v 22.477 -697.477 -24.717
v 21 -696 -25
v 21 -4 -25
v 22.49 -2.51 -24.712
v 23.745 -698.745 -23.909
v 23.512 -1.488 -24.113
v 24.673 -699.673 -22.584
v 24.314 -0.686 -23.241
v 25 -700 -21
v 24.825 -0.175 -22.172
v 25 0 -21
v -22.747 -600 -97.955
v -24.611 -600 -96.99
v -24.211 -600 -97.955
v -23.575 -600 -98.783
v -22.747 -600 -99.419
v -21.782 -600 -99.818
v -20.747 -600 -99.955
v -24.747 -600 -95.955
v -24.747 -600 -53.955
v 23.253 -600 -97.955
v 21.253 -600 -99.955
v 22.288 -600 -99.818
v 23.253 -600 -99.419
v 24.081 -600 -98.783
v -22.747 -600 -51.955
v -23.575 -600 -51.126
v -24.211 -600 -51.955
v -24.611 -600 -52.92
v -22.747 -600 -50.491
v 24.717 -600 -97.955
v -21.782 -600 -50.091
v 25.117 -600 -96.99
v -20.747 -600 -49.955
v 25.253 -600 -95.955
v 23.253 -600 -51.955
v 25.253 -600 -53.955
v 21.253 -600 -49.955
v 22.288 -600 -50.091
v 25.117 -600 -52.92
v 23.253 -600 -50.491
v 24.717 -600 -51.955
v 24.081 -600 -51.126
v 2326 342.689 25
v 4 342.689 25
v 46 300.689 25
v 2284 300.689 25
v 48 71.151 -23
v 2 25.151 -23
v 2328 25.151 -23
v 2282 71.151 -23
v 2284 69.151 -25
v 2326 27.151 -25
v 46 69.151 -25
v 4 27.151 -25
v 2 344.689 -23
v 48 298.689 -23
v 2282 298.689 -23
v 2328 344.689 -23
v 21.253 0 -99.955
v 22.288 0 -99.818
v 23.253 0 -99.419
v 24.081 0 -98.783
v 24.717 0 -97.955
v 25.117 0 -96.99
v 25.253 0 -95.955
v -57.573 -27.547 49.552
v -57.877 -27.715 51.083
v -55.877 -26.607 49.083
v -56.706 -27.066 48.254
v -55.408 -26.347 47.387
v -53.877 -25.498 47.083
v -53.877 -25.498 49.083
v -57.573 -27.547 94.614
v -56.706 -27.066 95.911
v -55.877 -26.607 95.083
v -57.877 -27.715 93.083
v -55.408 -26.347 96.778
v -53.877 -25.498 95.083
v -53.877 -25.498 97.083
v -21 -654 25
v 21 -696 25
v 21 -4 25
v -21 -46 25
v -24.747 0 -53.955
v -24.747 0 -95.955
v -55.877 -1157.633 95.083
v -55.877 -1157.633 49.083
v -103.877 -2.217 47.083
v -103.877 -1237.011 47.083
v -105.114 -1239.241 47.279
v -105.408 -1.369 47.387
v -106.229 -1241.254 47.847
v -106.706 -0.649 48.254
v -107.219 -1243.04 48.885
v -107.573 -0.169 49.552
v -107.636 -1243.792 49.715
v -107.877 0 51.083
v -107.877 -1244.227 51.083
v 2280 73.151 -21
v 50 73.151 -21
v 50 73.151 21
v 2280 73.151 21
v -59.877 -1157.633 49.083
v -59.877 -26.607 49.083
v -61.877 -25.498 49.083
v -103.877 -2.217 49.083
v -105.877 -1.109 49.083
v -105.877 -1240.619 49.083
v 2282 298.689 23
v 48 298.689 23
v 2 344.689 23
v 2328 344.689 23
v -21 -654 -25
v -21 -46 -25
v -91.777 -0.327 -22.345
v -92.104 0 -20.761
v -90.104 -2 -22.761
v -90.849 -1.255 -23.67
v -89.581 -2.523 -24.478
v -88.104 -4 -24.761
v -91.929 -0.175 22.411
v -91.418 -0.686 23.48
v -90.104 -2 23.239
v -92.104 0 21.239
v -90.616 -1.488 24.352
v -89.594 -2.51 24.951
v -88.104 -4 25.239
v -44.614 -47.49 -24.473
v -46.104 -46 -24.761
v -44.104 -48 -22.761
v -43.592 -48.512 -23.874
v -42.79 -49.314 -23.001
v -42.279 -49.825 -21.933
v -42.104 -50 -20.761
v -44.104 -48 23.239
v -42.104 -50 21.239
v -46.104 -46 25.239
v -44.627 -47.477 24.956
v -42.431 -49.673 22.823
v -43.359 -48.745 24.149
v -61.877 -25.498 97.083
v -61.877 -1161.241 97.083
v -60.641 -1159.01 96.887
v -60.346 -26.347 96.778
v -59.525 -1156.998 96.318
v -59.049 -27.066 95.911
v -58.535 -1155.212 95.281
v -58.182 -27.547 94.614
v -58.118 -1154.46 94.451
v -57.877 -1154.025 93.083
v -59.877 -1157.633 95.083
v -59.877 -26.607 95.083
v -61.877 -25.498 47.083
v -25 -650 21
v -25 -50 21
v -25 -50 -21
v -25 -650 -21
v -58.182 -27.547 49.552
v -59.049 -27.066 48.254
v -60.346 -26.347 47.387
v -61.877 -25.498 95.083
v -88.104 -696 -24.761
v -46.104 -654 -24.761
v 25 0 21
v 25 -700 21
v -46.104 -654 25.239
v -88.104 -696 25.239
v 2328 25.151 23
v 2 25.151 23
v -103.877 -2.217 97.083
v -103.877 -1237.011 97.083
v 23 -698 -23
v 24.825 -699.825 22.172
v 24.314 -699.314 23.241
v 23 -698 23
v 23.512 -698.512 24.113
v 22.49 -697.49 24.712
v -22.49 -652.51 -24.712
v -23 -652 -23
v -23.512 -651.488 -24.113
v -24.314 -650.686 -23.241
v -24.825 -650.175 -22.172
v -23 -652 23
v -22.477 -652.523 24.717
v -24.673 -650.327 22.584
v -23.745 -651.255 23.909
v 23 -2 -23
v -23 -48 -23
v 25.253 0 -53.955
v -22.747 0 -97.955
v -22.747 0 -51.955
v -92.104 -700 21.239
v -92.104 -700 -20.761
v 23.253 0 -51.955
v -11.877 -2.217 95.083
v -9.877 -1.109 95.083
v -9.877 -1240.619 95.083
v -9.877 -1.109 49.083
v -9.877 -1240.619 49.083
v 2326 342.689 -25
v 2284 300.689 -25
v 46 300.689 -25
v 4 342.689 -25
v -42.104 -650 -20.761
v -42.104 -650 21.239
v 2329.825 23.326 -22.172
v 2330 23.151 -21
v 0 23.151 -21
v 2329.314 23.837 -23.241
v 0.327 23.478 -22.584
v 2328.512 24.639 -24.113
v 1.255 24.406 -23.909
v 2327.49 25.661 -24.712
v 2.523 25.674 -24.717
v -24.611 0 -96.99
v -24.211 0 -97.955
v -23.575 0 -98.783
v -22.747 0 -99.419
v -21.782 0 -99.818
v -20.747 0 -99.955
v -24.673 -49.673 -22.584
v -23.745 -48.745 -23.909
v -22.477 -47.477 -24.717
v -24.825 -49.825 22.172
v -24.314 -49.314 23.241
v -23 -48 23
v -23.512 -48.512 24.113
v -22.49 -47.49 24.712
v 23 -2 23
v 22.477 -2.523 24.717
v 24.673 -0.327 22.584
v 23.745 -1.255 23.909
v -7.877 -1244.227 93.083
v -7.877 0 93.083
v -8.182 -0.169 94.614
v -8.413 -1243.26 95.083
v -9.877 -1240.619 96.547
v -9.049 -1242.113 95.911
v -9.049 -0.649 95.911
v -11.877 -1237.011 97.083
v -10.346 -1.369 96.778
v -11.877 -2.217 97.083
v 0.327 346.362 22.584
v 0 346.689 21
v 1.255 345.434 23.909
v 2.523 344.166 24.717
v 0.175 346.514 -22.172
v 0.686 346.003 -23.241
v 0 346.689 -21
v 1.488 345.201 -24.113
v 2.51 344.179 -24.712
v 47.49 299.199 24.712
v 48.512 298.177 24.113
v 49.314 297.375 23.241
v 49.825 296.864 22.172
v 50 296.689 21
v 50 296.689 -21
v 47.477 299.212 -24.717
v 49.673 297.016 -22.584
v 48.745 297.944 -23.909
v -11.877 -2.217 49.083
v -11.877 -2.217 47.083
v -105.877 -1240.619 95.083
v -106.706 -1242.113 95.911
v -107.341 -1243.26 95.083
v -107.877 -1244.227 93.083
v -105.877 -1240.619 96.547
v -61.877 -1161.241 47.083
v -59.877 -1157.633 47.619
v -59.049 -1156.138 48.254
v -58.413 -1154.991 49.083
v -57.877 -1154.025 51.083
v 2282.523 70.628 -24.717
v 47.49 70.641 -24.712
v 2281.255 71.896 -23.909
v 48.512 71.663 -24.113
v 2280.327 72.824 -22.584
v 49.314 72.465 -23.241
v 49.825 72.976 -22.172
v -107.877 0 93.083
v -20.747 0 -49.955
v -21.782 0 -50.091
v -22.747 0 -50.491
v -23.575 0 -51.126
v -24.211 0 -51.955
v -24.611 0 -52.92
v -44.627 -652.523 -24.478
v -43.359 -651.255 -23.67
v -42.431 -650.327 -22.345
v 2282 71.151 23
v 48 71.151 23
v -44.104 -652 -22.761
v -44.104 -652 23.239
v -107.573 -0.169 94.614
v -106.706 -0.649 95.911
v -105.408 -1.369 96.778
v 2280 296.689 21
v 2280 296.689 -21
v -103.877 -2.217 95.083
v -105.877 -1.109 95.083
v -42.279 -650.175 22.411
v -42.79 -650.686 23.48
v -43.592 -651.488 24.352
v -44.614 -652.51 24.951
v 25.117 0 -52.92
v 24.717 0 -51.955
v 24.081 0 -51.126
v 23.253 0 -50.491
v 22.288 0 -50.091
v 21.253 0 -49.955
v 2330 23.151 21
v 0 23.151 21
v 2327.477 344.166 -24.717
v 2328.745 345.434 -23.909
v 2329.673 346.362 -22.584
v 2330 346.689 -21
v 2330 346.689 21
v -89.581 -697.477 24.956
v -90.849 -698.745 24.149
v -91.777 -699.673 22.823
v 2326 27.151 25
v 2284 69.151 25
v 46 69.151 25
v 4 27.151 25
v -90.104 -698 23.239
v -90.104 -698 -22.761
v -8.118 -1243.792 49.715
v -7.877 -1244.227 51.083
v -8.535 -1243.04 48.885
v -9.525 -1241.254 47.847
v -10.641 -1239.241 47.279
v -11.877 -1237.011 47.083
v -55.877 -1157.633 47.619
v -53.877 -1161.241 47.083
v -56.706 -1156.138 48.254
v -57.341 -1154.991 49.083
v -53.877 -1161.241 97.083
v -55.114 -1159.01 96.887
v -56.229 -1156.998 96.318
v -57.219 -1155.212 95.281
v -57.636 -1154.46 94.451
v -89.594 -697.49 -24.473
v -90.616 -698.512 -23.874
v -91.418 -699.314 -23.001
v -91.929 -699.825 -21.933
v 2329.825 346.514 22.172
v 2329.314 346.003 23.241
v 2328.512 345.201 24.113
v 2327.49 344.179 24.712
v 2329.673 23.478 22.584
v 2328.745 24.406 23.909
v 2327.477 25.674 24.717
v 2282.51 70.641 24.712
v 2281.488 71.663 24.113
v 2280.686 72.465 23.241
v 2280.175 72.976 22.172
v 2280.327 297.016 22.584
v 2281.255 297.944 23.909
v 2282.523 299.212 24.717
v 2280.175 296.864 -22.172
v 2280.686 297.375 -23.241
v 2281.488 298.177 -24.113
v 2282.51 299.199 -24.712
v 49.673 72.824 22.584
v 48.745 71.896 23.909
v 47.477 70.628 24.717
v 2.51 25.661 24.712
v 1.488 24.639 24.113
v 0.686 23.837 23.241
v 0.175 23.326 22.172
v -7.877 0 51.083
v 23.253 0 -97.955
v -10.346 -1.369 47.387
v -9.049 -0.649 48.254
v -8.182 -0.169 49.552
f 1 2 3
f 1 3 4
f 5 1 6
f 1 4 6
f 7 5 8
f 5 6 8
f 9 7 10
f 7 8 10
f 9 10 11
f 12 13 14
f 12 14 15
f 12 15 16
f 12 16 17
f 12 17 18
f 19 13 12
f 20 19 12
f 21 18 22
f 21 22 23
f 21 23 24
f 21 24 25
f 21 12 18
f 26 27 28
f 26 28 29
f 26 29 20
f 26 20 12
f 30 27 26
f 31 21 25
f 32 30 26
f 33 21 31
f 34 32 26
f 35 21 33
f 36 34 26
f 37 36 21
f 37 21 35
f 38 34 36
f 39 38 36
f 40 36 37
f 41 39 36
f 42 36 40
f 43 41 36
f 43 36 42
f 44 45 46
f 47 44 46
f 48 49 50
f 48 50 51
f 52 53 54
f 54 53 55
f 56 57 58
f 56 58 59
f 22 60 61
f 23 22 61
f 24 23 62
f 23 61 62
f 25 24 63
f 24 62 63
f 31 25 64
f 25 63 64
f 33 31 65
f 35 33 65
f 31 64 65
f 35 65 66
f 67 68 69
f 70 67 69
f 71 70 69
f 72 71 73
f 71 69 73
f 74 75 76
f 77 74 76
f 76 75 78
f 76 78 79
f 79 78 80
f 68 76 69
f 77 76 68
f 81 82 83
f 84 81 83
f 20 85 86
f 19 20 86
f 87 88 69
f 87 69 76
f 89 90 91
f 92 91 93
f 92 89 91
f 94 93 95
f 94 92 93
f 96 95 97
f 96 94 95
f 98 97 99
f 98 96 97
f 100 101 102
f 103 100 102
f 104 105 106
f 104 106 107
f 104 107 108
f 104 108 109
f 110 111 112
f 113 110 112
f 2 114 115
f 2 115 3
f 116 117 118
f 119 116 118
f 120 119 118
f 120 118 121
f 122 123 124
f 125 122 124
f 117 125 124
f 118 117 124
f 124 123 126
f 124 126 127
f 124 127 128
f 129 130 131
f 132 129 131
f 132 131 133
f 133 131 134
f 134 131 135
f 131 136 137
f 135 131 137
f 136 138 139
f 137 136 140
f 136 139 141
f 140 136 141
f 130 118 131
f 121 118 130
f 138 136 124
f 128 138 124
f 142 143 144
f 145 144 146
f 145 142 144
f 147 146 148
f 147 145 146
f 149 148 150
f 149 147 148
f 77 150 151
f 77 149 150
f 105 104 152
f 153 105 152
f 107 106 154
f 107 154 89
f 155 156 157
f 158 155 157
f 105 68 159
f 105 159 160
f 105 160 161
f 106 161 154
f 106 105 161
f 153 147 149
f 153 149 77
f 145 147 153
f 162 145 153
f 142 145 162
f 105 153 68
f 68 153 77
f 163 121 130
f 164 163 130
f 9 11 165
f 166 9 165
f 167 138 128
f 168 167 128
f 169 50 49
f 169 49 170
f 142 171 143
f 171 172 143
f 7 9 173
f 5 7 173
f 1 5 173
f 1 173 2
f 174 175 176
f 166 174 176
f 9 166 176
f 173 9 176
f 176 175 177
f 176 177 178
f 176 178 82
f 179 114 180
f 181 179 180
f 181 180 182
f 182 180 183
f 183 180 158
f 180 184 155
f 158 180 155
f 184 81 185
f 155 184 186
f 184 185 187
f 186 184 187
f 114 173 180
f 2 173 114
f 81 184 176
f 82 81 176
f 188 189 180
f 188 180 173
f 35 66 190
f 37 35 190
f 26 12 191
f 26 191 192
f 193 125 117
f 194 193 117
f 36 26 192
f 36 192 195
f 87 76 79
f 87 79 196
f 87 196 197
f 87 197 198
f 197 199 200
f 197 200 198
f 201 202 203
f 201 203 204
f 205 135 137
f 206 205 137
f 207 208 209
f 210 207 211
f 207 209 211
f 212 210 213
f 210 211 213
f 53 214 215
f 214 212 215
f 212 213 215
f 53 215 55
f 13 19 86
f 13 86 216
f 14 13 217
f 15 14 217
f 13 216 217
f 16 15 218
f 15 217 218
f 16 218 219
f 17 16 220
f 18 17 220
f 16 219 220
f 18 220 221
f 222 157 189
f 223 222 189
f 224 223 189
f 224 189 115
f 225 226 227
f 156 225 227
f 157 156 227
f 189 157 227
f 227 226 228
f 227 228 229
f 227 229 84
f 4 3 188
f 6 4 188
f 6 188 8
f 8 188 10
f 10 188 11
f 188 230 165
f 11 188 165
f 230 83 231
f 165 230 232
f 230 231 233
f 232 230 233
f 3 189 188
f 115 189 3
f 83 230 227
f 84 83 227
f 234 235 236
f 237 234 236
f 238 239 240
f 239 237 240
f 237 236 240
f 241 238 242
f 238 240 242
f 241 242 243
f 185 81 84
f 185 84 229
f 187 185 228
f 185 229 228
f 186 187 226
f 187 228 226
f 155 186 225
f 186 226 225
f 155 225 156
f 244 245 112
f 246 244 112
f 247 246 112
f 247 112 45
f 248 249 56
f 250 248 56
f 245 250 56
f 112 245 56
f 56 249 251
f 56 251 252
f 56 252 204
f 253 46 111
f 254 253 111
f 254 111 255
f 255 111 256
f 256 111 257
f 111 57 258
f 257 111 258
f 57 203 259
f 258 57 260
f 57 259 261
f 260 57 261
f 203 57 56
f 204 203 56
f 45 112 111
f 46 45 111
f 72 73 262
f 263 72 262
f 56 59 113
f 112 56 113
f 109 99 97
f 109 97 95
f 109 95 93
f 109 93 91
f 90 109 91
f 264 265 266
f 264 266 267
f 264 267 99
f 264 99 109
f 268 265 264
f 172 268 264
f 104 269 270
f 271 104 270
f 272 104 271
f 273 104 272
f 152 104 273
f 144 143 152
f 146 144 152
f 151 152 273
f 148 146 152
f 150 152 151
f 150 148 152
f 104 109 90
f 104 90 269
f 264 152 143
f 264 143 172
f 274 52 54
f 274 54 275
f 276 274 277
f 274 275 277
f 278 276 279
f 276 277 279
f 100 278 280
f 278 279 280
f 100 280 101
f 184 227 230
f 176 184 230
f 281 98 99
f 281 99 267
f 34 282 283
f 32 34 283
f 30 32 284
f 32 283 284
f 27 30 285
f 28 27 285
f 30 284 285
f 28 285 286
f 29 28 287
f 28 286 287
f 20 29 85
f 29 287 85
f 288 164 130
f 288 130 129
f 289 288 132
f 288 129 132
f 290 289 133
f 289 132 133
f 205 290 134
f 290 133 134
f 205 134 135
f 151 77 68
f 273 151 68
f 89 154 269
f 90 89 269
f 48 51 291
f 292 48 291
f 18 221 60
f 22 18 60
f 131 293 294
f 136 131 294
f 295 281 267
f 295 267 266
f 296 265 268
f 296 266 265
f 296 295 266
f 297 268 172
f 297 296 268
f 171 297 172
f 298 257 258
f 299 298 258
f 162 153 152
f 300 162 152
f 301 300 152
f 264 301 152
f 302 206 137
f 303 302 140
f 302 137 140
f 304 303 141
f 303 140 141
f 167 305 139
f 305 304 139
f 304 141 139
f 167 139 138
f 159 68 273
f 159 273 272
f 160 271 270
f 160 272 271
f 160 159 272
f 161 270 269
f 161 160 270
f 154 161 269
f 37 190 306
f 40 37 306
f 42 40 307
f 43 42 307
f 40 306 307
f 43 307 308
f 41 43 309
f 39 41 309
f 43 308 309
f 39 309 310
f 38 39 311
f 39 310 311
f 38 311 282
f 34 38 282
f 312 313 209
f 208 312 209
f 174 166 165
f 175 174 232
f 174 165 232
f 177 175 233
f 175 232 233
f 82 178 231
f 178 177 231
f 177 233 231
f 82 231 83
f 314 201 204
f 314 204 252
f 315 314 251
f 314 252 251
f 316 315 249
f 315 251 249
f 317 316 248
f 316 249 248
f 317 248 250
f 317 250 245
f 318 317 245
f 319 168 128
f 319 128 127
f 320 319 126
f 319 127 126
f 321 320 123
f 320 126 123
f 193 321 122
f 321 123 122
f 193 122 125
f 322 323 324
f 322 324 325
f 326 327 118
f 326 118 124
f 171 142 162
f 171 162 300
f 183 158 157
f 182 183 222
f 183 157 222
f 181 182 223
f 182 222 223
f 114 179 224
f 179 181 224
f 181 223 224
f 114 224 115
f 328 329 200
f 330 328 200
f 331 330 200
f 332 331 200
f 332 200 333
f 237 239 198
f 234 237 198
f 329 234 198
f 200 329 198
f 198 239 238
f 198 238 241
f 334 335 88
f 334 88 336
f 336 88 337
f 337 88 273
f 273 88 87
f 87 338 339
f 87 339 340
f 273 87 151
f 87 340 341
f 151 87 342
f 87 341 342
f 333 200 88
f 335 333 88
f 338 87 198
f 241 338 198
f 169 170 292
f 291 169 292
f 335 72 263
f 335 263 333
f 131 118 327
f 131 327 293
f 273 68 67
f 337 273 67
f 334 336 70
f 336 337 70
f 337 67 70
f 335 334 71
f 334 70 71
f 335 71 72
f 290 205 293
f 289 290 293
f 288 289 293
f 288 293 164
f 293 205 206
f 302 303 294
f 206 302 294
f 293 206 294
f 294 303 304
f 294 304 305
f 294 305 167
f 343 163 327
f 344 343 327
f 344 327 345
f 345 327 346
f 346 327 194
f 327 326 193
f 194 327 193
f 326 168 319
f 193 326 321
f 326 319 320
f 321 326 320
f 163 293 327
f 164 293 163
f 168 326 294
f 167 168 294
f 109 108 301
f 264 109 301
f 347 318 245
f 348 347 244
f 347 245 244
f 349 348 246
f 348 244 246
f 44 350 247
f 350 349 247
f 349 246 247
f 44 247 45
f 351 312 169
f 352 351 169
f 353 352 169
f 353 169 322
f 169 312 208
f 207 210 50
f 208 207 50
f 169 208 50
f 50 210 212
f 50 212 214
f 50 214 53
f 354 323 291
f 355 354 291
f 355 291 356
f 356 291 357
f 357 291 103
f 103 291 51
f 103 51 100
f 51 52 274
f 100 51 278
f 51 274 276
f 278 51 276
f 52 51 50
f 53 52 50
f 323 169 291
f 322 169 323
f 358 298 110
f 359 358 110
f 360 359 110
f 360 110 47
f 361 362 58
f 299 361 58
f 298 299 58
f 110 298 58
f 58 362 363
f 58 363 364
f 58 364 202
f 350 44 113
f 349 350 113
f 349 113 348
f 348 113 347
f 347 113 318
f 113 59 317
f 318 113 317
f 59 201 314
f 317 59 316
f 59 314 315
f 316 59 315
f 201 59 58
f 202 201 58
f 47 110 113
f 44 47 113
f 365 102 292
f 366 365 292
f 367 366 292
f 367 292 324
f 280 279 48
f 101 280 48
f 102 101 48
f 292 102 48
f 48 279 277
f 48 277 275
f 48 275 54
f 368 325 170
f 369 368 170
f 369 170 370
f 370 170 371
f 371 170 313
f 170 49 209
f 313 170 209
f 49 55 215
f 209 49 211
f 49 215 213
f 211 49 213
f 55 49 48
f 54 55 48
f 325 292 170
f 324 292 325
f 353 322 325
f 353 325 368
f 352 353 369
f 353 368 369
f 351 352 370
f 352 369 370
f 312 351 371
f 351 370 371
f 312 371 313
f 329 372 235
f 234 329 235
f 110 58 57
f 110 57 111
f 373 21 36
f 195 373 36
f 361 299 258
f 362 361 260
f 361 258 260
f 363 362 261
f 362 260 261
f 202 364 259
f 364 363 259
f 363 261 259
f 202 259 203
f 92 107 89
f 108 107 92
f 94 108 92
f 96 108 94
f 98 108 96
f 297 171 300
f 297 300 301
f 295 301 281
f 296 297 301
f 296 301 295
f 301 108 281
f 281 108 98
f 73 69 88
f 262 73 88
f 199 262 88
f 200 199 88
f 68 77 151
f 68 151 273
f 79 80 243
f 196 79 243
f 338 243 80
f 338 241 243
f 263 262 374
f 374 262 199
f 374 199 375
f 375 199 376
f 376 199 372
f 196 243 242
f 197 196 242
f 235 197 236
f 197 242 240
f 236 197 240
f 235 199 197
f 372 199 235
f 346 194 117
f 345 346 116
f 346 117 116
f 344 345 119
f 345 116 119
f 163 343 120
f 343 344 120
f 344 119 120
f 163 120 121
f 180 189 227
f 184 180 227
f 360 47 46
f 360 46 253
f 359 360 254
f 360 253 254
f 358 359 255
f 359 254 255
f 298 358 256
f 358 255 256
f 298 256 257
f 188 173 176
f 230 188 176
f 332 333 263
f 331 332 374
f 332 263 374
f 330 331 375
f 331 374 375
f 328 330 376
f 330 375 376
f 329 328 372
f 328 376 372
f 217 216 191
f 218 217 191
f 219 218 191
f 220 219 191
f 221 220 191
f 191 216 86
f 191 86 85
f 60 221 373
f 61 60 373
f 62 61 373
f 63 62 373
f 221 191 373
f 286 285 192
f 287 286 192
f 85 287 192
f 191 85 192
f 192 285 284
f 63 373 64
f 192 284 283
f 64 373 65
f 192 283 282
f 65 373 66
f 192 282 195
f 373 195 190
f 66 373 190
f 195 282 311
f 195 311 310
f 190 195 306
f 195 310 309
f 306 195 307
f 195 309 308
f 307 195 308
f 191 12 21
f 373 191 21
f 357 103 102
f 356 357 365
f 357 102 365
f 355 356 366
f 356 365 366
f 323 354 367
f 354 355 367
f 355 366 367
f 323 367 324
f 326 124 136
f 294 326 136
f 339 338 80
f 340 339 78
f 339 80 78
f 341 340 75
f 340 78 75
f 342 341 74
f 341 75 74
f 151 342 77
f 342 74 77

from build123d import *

# Parameters (mm, degrees)
F0_W      = 46
F0_H      = 46
F1_DEPTH  = 700
F2_W      = 46
F2_H      = 46
F3_DEPTH  = 700
F5_DEPTH  = 50.001
F7_DEPTH  = 50.2400823502
F8_W      = 46
F8_H      = 46
F10_DEPTH = 2330
F9_W      = 46
F9_H      = 46
F11_DEPTH = 2330
F13_DEPTH = 50.2400823502
F15_DEPTH = 50.2400823502
F16_W     = 46
F16_H     = 46
F17_DEPTH = 600
F18_W     = 46
F18_H     = 46
F20_DEPTH = 1244.227
F19_W     = 46
F19_H     = 46
F21_DEPTH = 1244.227
F23_DEPTH = 197.0386737416


with BuildPart() as f1:
    # F0 (on Front) → F1 (new body)
    with BuildSketch(Plane.XZ):
        with BuildLine():
            ThreePointArc((25, 21), (23.8284271247, 23.8284271247), (21, 25))
            Line((21, 25), (-21, 25))
            ThreePointArc((-21, 25), (-23.8284271247, 23.8284271247), (-25, 21))
            Line((-25, 21), (-25, -21))
            ThreePointArc((-25, -21), (-23.8284271247, -23.8284271247), (-21, -25))
            Line((-21, -25), (21, -25))
            ThreePointArc((21, -25), (23.8284271247, -23.8284271247), (25, -21))
            Line((25, -21), (25, 21))
        make_face()
        Rectangle(F0_W, F0_H, mode=Mode.SUBTRACT)
    extrude(amount=F1_DEPTH)

    # F4 (on face) → F5 (cut, through all)
    with BuildSketch(Plane.XY.offset(25)):
        Polygon((-25, 0), (-25, -50), (-21, -46), (-21, 0), align=None)
        Polygon((-21, 0), (-21, -46), (21, -4), (21, 0), align=None)
        Polygon((21, 0), (21, -4), (25, 0), align=None)
        Polygon((-25, -650), (-25, -700), (-21, -700), (-21, -654), align=None)
        Polygon((-21, -654), (-21, -700), (21, -700), (21, -696), align=None)
        Polygon((21, -696), (21, -700), (25, -700), align=None)
    extrude(amount=-F5_DEPTH, mode=Mode.SUBTRACT)


with BuildPart() as f3:
    # F2 (on Front) → F3 (new body)
    with BuildSketch(Plane.XZ):
        with BuildLine():
            ThreePointArc((-42.1039521694, 21.2390823502), (-43.2755250447, 24.0675094749), (-46.1039521694, 25.2390823502))
            Line((-46.1039521694, 25.2390823502), (-88.1039521694, 25.2390823502))
            ThreePointArc((-88.1039521694, 25.2390823502), (-90.9323792942, 24.0675094749), (-92.1039521694, 21.2390823502))
            Line((-92.1039521694, 21.2390823502), (-92.1039521694, -20.7609176498))
            ThreePointArc((-92.1039521694, -20.7609176498), (-90.9323792942, -23.5893447746), (-88.1039521694, -24.7609176498))
            Line((-88.1039521694, -24.7609176498), (-46.1039521694, -24.7609176498))
            ThreePointArc((-46.1039521694, -24.7609176498), (-43.2755250447, -23.5893447746), (-42.1039521694, -20.7609176498))
            Line((-42.1039521694, -20.7609176498), (-42.1039521694, 21.2390823502))
        make_face()
        with Locations((-67.1039521694, 0.2390823502)):
            Rectangle(F2_W, F2_H, mode=Mode.SUBTRACT)
    extrude(amount=F3_DEPTH)

    # F6 (on face) → F7 (cut, through all)
    with BuildSketch(Plane.XY.offset(25.2390823502)):
        Polygon((-88.1039521694, 0), (-92.1039521694, 0), (-88.1039521694, -4), align=None)
        Polygon((-46.1039521694, 0), (-88.1039521694, 0), (-88.1039521694, -4), (-46.1039521694, -46), align=None)
        Polygon((-42.1039521694, 0), (-46.1039521694, 0), (-46.1039521694, -46), (-42.1039521694, -50), align=None)
        Polygon((-46.1039521694, -654), (-46.1039521694, -700), (-42.1039521694, -700), (-42.1039521694, -650), align=None)
        Polygon((-88.1039521694, -696), (-88.1039521694, -700), (-46.1039521694, -700), (-46.1039521694, -654), align=None)
        Polygon((-88.1039521694, -696), (-92.1039521694, -700), (-88.1039521694, -700), align=None)
    extrude(amount=-F7_DEPTH, mode=Mode.SUBTRACT)


with BuildPart() as f10:
    # F8 (on Right) → F10 (new body)
    with BuildSketch(Plane.YZ):
        with BuildLine():
            Line((300.6890394688, -25), (342.6890394688, -25))
            ThreePointArc((342.6890394688, -25), (345.5174665935, -23.8284271247), (346.6890394688, -21))
            Line((346.6890394688, -21), (346.6890394688, 21))
            ThreePointArc((346.6890394688, 21), (345.5174665935, 23.8284271247), (342.6890394688, 25))
            Line((342.6890394688, 25), (300.6890394688, 25))
            ThreePointArc((300.6890394688, 25), (297.860612344, 23.8284271247), (296.6890394688, 21))
            Line((296.6890394688, 21), (296.6890394688, -21))
            ThreePointArc((296.6890394688, -21), (297.860612344, -23.8284271247), (300.6890394688, -25))
        make_face()
        with Locations((321.6890394688, 0)):
            Rectangle(F8_W, F8_H, mode=Mode.SUBTRACT)
    extrude(amount=F10_DEPTH)

    # F14 (on face) → F15 (cut, through all)
    with BuildSketch(Plane(origin=(0, 0, -25), x_dir=(1, 0, 0), z_dir=(0, 0, -1))):
        Polygon((2326, -342.6890394688), (2330, -346.6890394688), (2330, -342.6890394688), align=None)
        Polygon((2326, -342.6890394688), (2330, -342.6890394688), (2330, -300.6890394688), (2284, -300.6890394688), align=None)
        Polygon((2284, -300.6890394688), (2330, -300.6890394688), (2330, -296.6890394688), (2280, -296.6890394688), align=None)
        Polygon((0, -296.6890394688), (0, -300.6890394688), (46, -300.6890394688), (50, -296.6890394688), align=None)
        Polygon((0, -300.6890394688), (0, -342.6890394688), (4, -342.6890394688), (46, -300.6890394688), align=None)
        Polygon((0, -342.6890394688), (0, -346.6890394688), (4, -342.6890394688), align=None)
    extrude(amount=-F15_DEPTH, mode=Mode.SUBTRACT)


with BuildPart() as f11:
    # F9 (on Right) → F11 (new body)
    with BuildSketch(Plane.YZ):
        with BuildLine():
            Line((27.1510125101, -25), (69.1510125101, -25))
            ThreePointArc((69.1510125101, -25), (71.9794396348, -23.8284271247), (73.1510125101, -21))
            Line((73.1510125101, -21), (73.1510125101, 21))
            ThreePointArc((73.1510125101, 21), (71.9794396348, 23.8284271247), (69.1510125101, 25))
            Line((69.1510125101, 25), (27.1510125101, 25))
            ThreePointArc((27.1510125101, 25), (24.3225853853, 23.8284271247), (23.1510125101, 21))
            Line((23.1510125101, 21), (23.1510125101, -21))
            ThreePointArc((23.1510125101, -21), (24.3225853853, -23.8284271247), (27.1510125101, -25))
        make_face()
        with Locations((48.1510125101, 0)):
            Rectangle(F9_W, F9_H, mode=Mode.SUBTRACT)
    extrude(amount=F11_DEPTH)

    # F12 (on face) → F13 (cut, through all)
    with BuildSketch(Plane(origin=(0, 0, -25), x_dir=(1, 0, 0), z_dir=(0, 0, -1))):
        Polygon((2280, -73.1510125101), (2330, -73.1510125101), (2330, -69.1510125101), (2284, -69.1510125101), align=None)
        Polygon((2284, -69.1510125101), (2330, -69.1510125101), (2330, -27.1510125101), (2326, -27.1510125101), align=None)
        Polygon((2326, -27.1510125101), (2330, -27.1510125101), (2330, -23.1510125101), align=None)
        Polygon((0, -73.1510125101), (50, -73.1510125101), (46, -69.1510125101), (0, -69.1510125101), align=None)
        Polygon((0, -69.1510125101), (46, -69.1510125101), (4, -27.1510125101), (0, -27.1510125101), align=None)
        Polygon((0, -27.1510125101), (4, -27.1510125101), (0, -23.1510125101), align=None)
    extrude(amount=-F13_DEPTH, mode=Mode.SUBTRACT)


with BuildPart() as f17:
    # F16 (on Front) → F17 (new body)
    with BuildSketch(Plane.XZ):
        with BuildLine():
            ThreePointArc((25.253039645, -53.9547965825), (24.0814667698, -51.1263694577), (21.253039645, -49.9547965825))
            Line((21.253039645, -49.9547965825), (-20.746960355, -49.9547965825))
            ThreePointArc((-20.746960355, -49.9547965825), (-23.5753874797, -51.1263694577), (-24.746960355, -53.9547965825))
            Line((-24.746960355, -53.9547965825), (-24.746960355, -95.9547965825))
            ThreePointArc((-24.746960355, -95.9547965825), (-23.5753874797, -98.7832237072), (-20.746960355, -99.9547965825))
            Line((-20.746960355, -99.9547965825), (21.253039645, -99.9547965825))
            ThreePointArc((21.253039645, -99.9547965825), (24.0814667698, -98.7832237072), (25.253039645, -95.9547965825))
            Line((25.253039645, -95.9547965825), (25.253039645, -53.9547965825))
        make_face()
        with Locations((0.253039645, -74.9547965825)):
            Rectangle(F16_W, F16_H, mode=Mode.SUBTRACT)
    extrude(amount=F17_DEPTH)


with BuildPart() as f20:
    # F18 (on Front) → F20 (new body)
    with BuildSketch(Plane.XZ):
        with BuildLine():
            ThreePointArc((64.6687351167, 93.0828771591), (63.4971622415, 95.9113042839), (60.6687351167, 97.0828771591))
            Line((60.6687351167, 97.0828771591), (18.6687351167, 97.0828771591))
            ThreePointArc((18.6687351167, 97.0828771591), (15.840307992, 95.9113042839), (14.6687351167, 93.0828771591))
            Line((14.6687351167, 93.0828771591), (14.6687351167, 51.0828771591))
            ThreePointArc((14.6687351167, 51.0828771591), (15.840307992, 48.2544500344), (18.6687351167, 47.0828771591))
            Line((18.6687351167, 47.0828771591), (60.6687351167, 47.0828771591))
            ThreePointArc((60.6687351167, 47.0828771591), (63.4971622415, 48.2544500344), (64.6687351167, 51.0828771591))
            Line((64.6687351167, 51.0828771591), (64.6687351167, 93.0828771591))
        make_face()
        with Locations((39.6687351167, 72.0828771591)):
            Rectangle(F18_W, F18_H, mode=Mode.SUBTRACT)
    extrude(amount=F20_DEPTH)


with BuildPart() as f21:
    # F19 (on Front) → F21 (new body)
    with BuildSketch(Plane.XZ):
        with BuildLine():
            ThreePointArc((-7.8771844506, 93.0828771591), (-9.0487573259, 95.9113042839), (-11.8771844506, 97.0828771591))
            Line((-11.8771844506, 97.0828771591), (-53.8771844506, 97.0828771591))
            ThreePointArc((-53.8771844506, 97.0828771591), (-56.7056115754, 95.9113042839), (-57.8771844506, 93.0828771591))
            Line((-57.8771844506, 93.0828771591), (-57.8771844506, 51.0828771591))
            ThreePointArc((-57.8771844506, 51.0828771591), (-56.7056115754, 48.2544500344), (-53.8771844506, 47.0828771591))
            Line((-53.8771844506, 47.0828771591), (-11.8771844506, 47.0828771591))
            ThreePointArc((-11.8771844506, 47.0828771591), (-9.0487573259, 48.2544500344), (-7.8771844506, 51.0828771591))
            Line((-7.8771844506, 51.0828771591), (-7.8771844506, 93.0828771591))
        make_face()
        with Locations((-32.8771844506, 72.0828771591)):
            Rectangle(F19_W, F19_H, mode=Mode.SUBTRACT)
    extrude(amount=F21_DEPTH)

    # F22 (on face) → F23 (cut, through all)
    with BuildSketch(Plane.XY.offset(97.0828771591)):
        Polygon((-57.8771844506, -1154.0246122364), (-57.8771844506, -1244.227), (-53.8771844506, -1244.227), (-53.8771844506, -1161.2408032575), align=None)
        Polygon((-53.8771844506, -1161.2408032575), (-53.8771844506, -1244.227), (-11.8771844506, -1244.227), (-11.8771844506, -1237.0108089789), align=None)
        Polygon((-11.8771844506, -1237.0108089789), (-11.8771844506, -1244.227), (-7.8771844506, -1244.227), align=None)
        Polygon((-57.8771844506, 0), (-57.8771844506, -27.7154525726), (-53.8771844506, -25.4982163668), (-53.8771844506, 0), align=None)
        Polygon((-53.8771844506, 0), (-53.8771844506, -25.4982163668), (-11.8771844506, -2.2172362058), (-11.8771844506, 0), align=None)
        Polygon((-11.8771844506, 0), (-11.8771844506, -2.2172362058), (-7.8771844506, 0), align=None)
    extrude(amount=-F23_DEPTH, mode=Mode.SUBTRACT)


with BuildPart() as f24_1:
    # F24: instance of F21
    add(f21.part.mirror(Plane(origin=(-57.8771844506, -590.8700324045, 72.0828771591), x_dir=(0, -1, 0), z_dir=(-1, 0, 0))))


solid = Compound([f1.part, f3.part, f10.part, f11.part, f17.part, f21.part, f24_1.part])
